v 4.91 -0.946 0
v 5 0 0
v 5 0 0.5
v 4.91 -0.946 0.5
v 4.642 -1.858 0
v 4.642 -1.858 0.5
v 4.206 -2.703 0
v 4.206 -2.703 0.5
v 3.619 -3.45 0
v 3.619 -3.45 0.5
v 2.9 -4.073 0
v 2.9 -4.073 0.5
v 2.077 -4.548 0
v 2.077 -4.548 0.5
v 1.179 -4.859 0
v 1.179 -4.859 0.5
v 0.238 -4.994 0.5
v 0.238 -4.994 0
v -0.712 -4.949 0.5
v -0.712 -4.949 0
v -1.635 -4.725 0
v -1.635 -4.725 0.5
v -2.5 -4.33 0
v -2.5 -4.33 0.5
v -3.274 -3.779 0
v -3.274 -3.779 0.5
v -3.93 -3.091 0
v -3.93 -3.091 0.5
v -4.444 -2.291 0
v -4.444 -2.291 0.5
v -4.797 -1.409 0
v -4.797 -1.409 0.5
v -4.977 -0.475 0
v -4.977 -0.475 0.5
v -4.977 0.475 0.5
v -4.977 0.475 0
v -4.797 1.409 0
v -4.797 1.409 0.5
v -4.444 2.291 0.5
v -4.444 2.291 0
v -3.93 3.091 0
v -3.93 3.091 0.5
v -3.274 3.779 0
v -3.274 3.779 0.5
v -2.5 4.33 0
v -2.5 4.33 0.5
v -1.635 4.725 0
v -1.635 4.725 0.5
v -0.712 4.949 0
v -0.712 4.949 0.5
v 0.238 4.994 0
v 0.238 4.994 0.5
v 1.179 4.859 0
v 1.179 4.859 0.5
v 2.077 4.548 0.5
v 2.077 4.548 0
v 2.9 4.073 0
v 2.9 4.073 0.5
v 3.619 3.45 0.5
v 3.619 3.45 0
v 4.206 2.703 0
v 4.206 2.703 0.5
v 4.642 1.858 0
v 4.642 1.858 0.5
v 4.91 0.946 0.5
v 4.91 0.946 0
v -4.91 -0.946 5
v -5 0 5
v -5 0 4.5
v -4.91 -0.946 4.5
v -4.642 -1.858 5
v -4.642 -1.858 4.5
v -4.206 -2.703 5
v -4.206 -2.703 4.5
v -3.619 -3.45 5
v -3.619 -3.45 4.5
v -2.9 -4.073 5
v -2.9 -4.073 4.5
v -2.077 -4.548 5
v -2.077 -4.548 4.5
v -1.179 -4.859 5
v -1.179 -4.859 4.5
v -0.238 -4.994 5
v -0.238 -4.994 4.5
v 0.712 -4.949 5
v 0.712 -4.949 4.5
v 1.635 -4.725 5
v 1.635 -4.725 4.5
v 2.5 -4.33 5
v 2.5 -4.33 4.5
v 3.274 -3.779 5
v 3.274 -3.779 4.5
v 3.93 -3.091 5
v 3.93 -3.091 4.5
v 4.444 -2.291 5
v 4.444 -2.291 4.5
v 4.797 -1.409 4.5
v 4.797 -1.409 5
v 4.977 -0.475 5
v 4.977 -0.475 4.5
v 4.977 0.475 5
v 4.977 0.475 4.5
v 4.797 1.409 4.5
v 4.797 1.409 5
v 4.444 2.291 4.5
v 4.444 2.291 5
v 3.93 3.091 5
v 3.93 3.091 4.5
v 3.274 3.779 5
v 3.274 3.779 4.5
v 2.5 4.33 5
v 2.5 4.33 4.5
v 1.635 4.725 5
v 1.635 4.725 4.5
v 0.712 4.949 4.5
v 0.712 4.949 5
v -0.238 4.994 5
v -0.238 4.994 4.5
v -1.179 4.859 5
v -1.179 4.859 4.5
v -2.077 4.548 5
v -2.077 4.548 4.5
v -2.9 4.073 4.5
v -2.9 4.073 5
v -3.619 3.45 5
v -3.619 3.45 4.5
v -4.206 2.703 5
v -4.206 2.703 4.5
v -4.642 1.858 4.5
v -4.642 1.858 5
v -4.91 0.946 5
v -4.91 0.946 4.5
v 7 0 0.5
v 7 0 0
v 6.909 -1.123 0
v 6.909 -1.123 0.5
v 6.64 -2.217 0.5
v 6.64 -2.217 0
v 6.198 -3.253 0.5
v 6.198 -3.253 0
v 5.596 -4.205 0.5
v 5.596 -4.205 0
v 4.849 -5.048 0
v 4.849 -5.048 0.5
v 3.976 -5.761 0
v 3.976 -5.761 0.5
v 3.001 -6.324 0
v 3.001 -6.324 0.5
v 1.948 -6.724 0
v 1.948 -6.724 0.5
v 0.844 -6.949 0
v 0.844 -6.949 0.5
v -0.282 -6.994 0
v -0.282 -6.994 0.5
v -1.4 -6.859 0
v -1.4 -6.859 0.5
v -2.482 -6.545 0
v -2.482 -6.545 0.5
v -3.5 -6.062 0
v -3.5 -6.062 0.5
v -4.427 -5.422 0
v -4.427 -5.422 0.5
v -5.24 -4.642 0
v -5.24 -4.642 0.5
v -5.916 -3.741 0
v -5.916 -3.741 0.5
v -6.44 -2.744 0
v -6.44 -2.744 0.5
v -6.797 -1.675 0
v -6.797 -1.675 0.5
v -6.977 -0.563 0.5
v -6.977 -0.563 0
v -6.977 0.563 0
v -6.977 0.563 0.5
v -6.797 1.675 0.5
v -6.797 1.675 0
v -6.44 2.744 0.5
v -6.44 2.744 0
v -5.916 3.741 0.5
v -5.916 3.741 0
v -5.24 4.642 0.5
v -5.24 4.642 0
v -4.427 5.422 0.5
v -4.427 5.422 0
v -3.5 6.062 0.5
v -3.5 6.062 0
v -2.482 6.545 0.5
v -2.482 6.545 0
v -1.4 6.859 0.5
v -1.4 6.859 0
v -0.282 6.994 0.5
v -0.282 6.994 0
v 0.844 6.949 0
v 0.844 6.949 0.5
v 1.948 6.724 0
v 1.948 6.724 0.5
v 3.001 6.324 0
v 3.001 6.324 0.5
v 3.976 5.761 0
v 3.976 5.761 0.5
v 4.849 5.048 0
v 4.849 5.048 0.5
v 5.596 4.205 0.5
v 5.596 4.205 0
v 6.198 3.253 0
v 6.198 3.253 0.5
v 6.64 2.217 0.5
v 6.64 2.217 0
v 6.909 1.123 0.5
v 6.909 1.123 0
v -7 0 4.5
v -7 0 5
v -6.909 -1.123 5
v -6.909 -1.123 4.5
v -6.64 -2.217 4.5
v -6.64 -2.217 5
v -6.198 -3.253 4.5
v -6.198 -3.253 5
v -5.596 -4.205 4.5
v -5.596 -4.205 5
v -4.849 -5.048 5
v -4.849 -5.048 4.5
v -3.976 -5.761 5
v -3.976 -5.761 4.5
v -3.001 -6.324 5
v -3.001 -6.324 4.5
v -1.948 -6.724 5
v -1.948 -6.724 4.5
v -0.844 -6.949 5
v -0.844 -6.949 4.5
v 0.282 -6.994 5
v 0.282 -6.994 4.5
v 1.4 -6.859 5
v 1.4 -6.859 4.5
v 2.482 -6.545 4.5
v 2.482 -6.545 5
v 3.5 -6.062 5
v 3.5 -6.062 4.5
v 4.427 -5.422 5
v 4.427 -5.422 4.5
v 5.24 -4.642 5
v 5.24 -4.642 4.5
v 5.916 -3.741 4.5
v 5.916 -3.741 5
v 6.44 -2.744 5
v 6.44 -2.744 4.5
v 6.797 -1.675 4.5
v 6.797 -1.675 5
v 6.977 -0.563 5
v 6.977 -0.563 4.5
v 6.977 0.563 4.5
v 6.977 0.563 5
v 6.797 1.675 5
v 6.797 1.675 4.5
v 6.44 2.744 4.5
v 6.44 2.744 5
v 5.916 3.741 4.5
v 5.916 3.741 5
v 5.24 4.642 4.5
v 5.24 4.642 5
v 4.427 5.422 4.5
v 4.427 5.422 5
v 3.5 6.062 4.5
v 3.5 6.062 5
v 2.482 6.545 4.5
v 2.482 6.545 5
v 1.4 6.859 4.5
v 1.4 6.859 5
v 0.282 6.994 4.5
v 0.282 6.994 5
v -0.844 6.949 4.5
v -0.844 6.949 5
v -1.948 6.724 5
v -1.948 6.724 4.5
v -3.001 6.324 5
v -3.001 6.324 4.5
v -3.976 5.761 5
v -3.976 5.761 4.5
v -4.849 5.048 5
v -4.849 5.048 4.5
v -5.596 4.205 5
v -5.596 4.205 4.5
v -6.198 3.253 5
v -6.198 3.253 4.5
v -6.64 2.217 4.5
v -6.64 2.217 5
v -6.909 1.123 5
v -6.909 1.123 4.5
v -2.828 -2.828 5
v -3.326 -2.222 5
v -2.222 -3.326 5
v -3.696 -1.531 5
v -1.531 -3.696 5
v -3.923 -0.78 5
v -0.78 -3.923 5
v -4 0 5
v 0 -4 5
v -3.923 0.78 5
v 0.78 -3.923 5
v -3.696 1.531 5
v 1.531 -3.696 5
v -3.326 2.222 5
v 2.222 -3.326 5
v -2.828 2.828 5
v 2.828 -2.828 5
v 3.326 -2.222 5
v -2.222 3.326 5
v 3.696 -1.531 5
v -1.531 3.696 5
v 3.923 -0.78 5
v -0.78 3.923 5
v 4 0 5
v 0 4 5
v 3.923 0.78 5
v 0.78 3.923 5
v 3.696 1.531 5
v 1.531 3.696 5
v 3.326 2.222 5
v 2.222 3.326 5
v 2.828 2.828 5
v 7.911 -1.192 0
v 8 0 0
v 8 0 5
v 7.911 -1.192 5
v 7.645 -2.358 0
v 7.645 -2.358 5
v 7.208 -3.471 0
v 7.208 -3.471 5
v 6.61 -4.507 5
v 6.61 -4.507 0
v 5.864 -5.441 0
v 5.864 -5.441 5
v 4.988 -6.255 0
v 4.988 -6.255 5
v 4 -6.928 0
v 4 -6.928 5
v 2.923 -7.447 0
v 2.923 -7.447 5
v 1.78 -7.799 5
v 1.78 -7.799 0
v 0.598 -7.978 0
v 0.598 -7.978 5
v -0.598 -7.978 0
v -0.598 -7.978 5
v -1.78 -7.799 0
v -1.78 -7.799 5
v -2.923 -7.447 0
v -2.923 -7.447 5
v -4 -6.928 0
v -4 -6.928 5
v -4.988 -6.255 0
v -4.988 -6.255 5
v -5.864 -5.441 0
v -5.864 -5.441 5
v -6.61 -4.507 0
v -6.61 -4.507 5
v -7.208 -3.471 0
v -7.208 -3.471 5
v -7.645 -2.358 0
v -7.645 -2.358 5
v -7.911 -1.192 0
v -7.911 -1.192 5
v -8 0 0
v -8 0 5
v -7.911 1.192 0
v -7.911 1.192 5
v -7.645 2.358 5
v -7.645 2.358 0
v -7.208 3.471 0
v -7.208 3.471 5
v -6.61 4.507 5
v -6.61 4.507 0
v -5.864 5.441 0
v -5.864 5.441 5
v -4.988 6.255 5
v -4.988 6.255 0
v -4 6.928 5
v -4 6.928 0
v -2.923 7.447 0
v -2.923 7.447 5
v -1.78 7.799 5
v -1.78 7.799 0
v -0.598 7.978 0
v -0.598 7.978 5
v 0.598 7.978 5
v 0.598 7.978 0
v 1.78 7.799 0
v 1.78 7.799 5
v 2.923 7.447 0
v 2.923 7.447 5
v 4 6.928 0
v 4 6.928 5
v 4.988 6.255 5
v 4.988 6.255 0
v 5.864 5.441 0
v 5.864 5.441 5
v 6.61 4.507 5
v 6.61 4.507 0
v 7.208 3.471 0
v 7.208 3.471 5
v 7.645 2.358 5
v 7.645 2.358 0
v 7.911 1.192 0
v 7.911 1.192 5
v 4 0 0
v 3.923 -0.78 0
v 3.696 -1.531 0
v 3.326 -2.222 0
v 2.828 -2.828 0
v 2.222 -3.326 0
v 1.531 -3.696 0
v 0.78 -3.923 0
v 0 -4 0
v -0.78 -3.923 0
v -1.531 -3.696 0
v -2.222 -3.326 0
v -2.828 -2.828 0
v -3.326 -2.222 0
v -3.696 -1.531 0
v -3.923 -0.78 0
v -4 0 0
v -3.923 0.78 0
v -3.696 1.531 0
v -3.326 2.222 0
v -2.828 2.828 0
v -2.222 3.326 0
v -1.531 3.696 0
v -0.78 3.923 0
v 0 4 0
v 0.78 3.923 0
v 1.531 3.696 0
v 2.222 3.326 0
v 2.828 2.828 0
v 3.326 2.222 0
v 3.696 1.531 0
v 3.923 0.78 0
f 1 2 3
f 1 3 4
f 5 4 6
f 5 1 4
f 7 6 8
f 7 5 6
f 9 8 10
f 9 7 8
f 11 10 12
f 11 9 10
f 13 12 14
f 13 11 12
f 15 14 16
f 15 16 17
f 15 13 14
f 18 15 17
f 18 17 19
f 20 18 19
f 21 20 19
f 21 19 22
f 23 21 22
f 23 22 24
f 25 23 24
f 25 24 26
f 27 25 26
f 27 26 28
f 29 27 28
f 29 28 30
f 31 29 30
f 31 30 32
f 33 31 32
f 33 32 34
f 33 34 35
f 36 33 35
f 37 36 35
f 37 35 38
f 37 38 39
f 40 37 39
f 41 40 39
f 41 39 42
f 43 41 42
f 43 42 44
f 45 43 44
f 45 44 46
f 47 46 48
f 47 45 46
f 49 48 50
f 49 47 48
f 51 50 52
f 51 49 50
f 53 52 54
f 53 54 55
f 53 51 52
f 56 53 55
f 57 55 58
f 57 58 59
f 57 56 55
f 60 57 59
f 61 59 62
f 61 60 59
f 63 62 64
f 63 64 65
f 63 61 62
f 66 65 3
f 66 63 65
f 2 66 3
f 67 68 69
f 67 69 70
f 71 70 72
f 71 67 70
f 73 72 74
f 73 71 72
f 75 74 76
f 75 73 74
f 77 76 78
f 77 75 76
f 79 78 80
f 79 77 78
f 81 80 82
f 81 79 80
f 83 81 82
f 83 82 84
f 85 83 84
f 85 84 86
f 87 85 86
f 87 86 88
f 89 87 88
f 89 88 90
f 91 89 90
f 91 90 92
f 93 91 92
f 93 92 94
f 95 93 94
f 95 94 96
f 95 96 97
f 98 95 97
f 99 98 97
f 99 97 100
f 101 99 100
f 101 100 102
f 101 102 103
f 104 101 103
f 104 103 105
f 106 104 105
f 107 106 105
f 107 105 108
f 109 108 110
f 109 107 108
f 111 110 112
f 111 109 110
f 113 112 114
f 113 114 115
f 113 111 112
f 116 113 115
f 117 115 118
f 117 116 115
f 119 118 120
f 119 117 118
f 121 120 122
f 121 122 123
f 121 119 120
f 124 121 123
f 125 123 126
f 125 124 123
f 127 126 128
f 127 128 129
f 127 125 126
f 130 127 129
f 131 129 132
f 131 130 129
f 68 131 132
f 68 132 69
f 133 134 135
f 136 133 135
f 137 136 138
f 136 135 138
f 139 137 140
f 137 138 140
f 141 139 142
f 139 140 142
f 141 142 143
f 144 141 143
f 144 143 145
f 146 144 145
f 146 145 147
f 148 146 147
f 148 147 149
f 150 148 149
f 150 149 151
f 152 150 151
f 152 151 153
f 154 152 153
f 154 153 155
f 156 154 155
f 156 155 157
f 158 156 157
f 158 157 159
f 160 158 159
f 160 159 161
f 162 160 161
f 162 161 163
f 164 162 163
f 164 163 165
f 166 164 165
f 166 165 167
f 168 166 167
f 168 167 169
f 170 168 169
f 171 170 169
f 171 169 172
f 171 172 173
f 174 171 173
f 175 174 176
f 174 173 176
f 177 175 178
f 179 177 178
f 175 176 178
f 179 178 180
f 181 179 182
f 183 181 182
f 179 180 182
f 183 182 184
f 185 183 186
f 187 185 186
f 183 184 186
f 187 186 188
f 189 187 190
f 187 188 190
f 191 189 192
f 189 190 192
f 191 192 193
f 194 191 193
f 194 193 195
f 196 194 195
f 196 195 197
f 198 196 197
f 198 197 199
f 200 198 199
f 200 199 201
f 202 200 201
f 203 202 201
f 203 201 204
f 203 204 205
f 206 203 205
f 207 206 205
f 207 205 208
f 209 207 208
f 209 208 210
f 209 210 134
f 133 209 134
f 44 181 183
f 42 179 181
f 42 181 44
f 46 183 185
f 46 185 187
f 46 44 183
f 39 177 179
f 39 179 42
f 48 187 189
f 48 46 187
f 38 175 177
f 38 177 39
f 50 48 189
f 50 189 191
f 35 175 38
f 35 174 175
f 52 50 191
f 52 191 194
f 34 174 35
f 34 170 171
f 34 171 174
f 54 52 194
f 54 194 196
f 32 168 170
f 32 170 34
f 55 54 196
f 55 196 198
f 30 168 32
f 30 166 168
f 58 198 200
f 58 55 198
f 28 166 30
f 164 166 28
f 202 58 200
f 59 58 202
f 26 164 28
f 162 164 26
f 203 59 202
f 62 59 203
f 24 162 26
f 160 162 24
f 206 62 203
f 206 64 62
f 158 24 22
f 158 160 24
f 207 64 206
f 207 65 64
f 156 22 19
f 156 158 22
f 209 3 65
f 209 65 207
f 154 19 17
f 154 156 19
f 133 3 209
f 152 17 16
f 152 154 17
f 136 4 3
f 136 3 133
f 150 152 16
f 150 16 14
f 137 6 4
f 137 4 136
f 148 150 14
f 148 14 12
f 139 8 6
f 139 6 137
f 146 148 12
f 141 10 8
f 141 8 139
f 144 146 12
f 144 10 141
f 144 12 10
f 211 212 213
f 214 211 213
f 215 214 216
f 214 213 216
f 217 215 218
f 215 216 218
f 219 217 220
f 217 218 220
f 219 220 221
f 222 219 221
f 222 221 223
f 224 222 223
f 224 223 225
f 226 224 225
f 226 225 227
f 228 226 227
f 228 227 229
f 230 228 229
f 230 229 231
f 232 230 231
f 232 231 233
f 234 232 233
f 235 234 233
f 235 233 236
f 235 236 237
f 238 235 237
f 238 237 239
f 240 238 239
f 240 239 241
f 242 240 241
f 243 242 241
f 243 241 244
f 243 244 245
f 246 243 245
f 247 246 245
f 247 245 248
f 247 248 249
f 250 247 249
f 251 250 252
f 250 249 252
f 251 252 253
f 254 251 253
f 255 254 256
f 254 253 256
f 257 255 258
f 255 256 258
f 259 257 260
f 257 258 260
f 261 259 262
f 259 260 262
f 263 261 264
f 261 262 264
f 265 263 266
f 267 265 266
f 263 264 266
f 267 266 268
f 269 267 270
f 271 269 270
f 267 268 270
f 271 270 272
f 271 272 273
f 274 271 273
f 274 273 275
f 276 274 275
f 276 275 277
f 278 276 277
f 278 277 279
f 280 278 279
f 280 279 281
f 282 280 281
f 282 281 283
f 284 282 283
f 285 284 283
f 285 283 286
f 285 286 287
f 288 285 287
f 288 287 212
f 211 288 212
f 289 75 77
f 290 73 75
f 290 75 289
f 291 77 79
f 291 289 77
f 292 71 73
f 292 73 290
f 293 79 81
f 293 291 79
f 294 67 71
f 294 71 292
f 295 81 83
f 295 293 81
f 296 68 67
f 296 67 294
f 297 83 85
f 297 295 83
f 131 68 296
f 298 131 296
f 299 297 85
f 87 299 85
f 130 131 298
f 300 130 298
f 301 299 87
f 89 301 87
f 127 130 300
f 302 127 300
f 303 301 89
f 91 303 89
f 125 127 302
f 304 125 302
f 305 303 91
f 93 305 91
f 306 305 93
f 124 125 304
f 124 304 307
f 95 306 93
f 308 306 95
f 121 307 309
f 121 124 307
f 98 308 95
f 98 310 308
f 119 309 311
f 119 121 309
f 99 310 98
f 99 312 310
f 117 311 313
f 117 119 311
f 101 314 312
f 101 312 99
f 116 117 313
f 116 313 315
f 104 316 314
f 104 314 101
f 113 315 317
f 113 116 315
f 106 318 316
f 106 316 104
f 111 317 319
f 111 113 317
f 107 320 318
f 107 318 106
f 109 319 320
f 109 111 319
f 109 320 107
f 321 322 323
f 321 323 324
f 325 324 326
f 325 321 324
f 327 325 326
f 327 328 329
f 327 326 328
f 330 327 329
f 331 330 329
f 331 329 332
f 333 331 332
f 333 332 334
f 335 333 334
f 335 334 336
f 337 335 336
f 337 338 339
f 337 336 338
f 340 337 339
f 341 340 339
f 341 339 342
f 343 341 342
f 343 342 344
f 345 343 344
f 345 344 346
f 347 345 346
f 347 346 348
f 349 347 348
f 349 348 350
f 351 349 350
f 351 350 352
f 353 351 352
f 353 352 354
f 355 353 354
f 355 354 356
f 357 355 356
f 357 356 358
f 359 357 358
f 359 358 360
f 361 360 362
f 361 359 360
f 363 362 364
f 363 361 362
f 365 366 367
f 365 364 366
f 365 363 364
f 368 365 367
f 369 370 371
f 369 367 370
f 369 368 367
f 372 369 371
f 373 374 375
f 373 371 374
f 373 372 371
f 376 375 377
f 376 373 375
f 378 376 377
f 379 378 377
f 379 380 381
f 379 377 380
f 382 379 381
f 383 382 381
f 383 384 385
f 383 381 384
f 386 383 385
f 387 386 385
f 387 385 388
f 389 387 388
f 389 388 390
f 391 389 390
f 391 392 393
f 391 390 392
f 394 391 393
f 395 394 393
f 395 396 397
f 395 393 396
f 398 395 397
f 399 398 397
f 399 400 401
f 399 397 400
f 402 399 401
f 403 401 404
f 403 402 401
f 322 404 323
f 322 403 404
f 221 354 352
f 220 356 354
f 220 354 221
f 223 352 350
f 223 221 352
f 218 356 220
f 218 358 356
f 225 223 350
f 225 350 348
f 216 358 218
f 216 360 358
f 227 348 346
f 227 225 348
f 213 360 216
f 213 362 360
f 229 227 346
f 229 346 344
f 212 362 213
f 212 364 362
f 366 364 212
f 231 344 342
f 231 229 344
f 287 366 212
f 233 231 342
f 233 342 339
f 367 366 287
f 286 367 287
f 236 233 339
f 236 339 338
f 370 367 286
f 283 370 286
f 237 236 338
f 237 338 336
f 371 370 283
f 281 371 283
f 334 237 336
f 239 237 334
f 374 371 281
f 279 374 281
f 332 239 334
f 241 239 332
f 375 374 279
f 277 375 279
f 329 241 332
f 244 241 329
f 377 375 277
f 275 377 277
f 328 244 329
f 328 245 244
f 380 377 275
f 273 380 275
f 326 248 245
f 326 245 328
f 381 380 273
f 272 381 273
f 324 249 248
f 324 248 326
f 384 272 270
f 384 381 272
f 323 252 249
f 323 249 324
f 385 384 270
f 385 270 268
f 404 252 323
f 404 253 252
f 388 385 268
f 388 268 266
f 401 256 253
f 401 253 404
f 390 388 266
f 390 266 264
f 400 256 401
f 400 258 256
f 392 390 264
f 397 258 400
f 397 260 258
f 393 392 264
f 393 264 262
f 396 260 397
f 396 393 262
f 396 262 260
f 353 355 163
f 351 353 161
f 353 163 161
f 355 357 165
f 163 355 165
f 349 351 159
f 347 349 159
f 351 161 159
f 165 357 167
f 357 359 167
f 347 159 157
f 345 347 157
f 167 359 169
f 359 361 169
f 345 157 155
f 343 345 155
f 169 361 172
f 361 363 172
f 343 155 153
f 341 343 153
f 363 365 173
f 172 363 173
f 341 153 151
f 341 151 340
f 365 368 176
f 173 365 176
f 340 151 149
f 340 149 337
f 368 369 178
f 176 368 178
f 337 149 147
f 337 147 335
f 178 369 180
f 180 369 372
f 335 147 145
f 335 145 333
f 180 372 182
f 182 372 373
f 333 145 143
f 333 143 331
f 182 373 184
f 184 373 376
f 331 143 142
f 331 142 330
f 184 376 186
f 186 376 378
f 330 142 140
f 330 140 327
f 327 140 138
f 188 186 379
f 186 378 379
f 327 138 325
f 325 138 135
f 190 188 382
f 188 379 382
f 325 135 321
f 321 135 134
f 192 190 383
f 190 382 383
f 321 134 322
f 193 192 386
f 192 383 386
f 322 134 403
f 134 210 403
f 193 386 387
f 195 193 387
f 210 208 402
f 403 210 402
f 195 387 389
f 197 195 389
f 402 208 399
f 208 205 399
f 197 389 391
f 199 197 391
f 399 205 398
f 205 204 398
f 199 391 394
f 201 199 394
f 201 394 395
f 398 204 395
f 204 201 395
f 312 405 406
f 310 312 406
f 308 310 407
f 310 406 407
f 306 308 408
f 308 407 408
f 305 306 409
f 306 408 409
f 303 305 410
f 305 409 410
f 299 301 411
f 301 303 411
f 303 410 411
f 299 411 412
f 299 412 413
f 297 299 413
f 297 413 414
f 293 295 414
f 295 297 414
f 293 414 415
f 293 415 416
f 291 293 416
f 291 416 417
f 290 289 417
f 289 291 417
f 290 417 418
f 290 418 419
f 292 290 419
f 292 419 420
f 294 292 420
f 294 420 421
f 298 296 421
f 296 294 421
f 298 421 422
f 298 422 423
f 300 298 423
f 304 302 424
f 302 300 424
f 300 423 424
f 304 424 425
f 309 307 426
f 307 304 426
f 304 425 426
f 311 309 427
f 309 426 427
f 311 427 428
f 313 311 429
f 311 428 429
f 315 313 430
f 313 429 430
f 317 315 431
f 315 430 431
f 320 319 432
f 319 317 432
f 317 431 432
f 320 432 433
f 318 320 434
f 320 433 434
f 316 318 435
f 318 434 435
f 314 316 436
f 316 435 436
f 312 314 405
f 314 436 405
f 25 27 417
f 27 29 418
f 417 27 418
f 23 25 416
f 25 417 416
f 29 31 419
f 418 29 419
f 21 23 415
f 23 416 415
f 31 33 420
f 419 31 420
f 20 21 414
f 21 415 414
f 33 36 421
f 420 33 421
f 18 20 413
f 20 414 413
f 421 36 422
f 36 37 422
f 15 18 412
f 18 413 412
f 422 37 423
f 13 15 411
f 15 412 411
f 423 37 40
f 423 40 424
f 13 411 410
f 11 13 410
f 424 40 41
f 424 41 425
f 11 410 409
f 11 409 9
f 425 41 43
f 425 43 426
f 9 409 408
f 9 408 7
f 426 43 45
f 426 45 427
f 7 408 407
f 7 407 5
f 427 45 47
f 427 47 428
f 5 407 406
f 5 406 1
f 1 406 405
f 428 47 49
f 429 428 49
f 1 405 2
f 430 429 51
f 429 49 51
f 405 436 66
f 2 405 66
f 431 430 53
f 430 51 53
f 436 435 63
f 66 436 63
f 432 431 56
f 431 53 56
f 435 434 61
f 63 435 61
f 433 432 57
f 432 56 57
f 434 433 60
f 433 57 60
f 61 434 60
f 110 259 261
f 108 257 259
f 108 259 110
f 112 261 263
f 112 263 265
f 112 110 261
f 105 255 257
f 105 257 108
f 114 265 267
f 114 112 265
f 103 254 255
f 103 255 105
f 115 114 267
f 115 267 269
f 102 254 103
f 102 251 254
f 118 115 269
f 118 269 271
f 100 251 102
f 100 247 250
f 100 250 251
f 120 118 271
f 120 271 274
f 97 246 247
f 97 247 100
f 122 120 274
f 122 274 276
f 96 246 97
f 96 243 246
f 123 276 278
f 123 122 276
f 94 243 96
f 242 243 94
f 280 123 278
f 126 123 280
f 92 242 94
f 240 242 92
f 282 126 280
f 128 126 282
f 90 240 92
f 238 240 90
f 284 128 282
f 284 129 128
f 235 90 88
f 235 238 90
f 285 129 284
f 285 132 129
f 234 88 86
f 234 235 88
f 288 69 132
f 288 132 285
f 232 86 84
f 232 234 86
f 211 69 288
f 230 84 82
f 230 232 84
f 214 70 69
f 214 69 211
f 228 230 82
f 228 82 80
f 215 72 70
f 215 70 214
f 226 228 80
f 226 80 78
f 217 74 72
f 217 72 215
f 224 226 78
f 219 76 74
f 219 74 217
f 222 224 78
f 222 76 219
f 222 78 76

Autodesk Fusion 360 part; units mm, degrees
sketch "Sketch1" plane through (0, 0, 0) normal (0, 0, 1) x (1, 0, 0)
  circle A0 centre (0, 0) radius 8
  circle A1 centre (0, 0) radius 4
  dimension "d1" = 16
  dimension "d2" = 8
extrude "Extrude1" add sketch "Sketch1" along normal blind 5
sketch "Sketch2" plane through (0, 0, 5) normal (0, 0, 1) x (-1, 0, 0)
  circle A0 centre (0, 0) radius 4
  circle A1 centre (0, 0) radius 8
  circle A2 centre (0, 0) radius 7
  circle A3 centre (0, 0) radius 5
  dimension "d5" = -1
  dimension "d6" = 1
extrude "Extrude2" cut sketch "Sketch2" against normal blind 0.5 contours A2
sketch "Sketch3" plane through (0, 0, 0) normal (0, 0, -1) x (1, 0, 0)
  circle A0 centre (0, 0) radius 4
  circle A1 centre (0, 0) radius 8
  circle A2 centre (0, 0) radius 5
  circle A3 centre (0, 0) radius 7
extrude "Extrude3" cut sketch "Sketch3" against normal blind 0.5 contours A3
